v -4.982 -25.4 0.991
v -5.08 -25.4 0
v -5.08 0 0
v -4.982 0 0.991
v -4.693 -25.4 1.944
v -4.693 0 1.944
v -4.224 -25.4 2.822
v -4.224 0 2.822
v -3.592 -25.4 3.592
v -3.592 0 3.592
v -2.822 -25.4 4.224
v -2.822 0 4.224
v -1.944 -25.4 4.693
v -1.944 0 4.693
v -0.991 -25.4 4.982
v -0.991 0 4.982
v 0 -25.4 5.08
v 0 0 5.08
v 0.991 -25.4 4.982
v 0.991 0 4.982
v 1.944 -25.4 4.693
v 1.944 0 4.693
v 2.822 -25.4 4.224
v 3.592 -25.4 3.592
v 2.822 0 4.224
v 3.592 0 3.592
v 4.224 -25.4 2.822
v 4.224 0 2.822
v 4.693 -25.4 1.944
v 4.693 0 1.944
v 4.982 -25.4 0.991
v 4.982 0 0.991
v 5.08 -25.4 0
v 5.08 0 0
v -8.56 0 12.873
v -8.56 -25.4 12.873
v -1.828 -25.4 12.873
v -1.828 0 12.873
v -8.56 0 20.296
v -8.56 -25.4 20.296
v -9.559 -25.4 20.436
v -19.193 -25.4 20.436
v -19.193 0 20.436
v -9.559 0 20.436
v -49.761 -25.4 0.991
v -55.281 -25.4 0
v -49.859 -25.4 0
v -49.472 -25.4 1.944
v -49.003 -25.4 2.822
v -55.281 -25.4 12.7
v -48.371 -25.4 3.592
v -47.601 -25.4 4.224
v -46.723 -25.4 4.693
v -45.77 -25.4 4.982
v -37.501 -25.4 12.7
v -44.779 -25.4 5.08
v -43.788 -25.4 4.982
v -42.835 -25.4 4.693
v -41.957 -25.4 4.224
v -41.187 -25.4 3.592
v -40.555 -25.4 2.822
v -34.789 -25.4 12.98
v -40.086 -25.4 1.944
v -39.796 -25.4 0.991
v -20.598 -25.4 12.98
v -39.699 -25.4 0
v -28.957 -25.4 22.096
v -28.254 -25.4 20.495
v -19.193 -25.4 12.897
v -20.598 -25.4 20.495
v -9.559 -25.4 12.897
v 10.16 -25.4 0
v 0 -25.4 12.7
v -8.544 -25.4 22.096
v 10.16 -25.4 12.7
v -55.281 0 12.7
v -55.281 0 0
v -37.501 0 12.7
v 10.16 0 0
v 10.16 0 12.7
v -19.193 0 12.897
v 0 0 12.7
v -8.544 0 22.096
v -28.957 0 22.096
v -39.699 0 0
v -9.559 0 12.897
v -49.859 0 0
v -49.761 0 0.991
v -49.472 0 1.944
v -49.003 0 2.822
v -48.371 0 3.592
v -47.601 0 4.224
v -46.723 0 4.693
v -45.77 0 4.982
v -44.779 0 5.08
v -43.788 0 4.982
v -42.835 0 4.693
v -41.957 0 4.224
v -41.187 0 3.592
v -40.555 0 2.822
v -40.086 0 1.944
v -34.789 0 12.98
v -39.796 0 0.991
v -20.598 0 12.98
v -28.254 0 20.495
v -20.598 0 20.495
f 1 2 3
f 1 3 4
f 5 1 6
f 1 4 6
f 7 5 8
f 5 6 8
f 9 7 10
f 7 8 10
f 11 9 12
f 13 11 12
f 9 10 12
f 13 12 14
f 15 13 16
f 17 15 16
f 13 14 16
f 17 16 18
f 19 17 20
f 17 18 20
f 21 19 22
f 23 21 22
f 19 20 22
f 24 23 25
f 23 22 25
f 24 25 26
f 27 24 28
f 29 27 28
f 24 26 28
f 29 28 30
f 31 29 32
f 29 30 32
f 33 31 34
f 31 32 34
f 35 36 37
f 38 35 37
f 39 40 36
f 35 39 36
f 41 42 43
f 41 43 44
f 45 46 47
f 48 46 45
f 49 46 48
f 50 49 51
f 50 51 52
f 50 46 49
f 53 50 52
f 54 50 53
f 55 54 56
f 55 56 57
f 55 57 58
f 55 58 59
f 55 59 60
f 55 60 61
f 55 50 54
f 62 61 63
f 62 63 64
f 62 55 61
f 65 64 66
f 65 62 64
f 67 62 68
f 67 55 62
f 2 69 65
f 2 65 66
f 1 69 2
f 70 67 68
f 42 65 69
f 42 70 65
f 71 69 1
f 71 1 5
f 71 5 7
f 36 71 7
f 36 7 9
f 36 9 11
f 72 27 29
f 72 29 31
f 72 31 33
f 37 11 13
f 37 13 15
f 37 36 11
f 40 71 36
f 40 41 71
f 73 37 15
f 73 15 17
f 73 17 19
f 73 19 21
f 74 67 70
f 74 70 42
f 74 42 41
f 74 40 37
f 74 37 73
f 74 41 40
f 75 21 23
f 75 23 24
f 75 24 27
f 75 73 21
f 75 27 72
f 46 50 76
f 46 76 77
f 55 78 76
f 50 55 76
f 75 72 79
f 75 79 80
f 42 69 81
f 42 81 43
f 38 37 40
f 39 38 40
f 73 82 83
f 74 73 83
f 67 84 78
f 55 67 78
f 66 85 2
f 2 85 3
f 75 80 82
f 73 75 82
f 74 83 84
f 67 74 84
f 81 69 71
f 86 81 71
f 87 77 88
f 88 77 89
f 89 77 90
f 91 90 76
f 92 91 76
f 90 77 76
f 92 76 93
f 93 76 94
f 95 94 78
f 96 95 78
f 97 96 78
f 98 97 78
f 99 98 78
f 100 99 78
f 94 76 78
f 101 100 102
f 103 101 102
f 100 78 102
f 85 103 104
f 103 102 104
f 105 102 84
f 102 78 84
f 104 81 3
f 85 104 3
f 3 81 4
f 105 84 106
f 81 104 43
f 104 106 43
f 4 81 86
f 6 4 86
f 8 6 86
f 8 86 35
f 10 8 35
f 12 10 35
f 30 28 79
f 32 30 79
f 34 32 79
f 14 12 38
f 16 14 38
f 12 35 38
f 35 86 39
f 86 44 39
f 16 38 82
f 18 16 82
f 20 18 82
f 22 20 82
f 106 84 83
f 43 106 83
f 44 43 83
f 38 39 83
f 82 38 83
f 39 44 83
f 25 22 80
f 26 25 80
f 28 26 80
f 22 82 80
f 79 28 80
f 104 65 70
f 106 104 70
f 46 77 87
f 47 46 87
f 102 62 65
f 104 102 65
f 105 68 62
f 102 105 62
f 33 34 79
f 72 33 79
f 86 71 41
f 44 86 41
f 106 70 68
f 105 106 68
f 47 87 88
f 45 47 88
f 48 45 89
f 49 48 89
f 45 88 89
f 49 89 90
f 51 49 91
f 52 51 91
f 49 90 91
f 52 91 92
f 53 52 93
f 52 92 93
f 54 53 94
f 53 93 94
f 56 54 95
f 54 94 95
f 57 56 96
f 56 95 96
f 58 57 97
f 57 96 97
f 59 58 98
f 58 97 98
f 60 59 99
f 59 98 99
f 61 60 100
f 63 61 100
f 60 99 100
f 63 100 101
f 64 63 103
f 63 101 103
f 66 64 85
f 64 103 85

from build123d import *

# Parameters (mm, degrees)
F1_DEPTH = 25.4
F3_DEPTH = 25.4
F4_W     = 9.634385
F4_H     = 7.539335
F5_DEPTH = 25.4
F7_DEPTH = 25.4


with BuildPart() as f1:
    # F0 (on Front) → F1 (new body)
    with BuildSketch(Plane.XZ):
        with BuildLine():
            Line((-37.501371, 12.7), (-55.281371, 12.7))
            Line((-55.281371, 12.7), (-55.281371, 0))
            Line((-55.281371, 0), (-49.858869, 0))
            ThreePointArc((-49.858869, 0), (-44.778869, 5.08), (-39.698869, 0))
            Line((-39.698869, 0), (-5.08, 0))
            ThreePointArc((-5.08, 0), (0, 5.08), (5.08, 0))
            Line((5.08, 0), (10.16, 0))
            Line((10.16, 0), (10.16, 12.7))
            Line((10.16, 12.7), (0, 12.7))
            Line((0, 12.7), (-8.544024, 22.096257))
            Line((-8.544024, 22.096257), (-28.957347, 22.096257))
            Line((-28.957347, 22.096257), (-37.501371, 12.7))
        make_face()
    extrude(amount=F1_DEPTH)

    # F2 (on face) → F3 (cut)
    with BuildSketch(Plane.XZ.offset(25.4)):
        Polygon((-28.253765, 20.494862), (-34.789096, 12.980141), (-20.598149, 12.980141), (-20.598149, 20.494862), align=None)
    extrude(amount=-F3_DEPTH, mode=Mode.SUBTRACT)

    # F4 (on face) → F5 (cut)
    with BuildSketch(Plane.XZ.offset(25.4)):
        with Locations((-14.375965, 16.666421)):
            Rectangle(F4_W, F4_H)
    extrude(amount=-F5_DEPTH, mode=Mode.SUBTRACT)

    # F6 (on face) → F7 (cut)
    with BuildSketch(Plane.XZ.offset(25.4)):
        Polygon((-1.828437, 12.872539), (-8.559588, 20.295901), (-8.559588, 12.872539), align=None)
    extrude(amount=-F7_DEPTH, mode=Mode.SUBTRACT)


solid = f1.part
